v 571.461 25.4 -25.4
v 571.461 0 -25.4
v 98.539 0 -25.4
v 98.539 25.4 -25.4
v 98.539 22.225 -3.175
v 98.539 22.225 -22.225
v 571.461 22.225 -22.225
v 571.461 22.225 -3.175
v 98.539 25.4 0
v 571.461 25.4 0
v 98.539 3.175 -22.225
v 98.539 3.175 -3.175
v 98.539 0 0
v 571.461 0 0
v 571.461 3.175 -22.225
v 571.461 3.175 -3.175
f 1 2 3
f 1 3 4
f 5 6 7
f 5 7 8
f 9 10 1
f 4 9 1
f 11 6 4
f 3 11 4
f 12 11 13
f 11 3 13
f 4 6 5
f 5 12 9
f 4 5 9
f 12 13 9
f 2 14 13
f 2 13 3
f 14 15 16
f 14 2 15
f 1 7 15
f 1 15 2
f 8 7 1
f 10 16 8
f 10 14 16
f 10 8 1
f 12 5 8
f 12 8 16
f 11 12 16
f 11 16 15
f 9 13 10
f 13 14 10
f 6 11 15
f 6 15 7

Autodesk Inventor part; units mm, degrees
sketch "Sketch1" plane through (0, 0, 0) normal (1, 0, 0) x (0, 1, 0)
  line L0 (0, 0) -> (25.4, 0)
  line L1 (25.4, 0) -> (25.4, -25.4)
  line L2 (0, 0) -> (0, -25.4)
  line L3 (0, -25.4) -> (25.4, -25.4)
  line L4 (22.225, -22.225) -> (22.225, -3.175)
  line L5 (22.225, -3.175) -> (3.175, -3.175)
  line L6 (3.175, -3.175) -> (3.175, -22.225)
  line L7 (3.175, -22.225) -> (22.225, -22.225)
  dimension "d1" = 25.4
  dimension "d5" = 25.4
  dimension "d7" = 25.4
  dimension "d8" = 3.175
ref_plane "Work Plane1" through (121.4904, -591.0492, 62.9788) normal (-1, 0, 0) x (0, -0.0011, 1)
ref_plane "Work Plane2" through (594.413, -591.0492, 62.9788) normal (1, 0, 0) x (0, 1, 0.0011)
ref_plane "Work Plane3" through (121.4904, -685.829, -0.8415) normal (-1, 0, 0) x (0, 0, 1)
ref_plane "Work Plane4" through (572.188, -685.8218, 2.3335) normal (1, 0, 0) x (0, 1, 0)
ref_plane "Work Plane5" through (571.4614, -9.58, -1.5962) normal (1, 0, 0) x (0, 1, 0)
ref_plane "Work Plane6" through (98.5388, -9.58, -1.5962) normal (-1, 0, 0) x (0, 0, 1)
extrude "Extrusion1" add sketch "Sketch1" against normal up to surface (472.9226 mm away) from surface at 571.4614 contours L0 L1 L3 L2 | L7 L6 L5 L4
ref_plane "Work Plane7" through (98.5388, -9.554, -0.8415) normal (-1, 0, 0) x (0, 0, 1)
ref_plane "Work Plane8" through (571.4614, -9.554, -0.8415) normal (1, 0, 0) x (0, 1, 0)
extrude "Extrusion2" cut sketch "Sketch1" along normal up to surface (472.9226 mm away) from surface at 98.5388 contours L7 L6 L5 L4
properties part number "15102898-16-P-0219"
